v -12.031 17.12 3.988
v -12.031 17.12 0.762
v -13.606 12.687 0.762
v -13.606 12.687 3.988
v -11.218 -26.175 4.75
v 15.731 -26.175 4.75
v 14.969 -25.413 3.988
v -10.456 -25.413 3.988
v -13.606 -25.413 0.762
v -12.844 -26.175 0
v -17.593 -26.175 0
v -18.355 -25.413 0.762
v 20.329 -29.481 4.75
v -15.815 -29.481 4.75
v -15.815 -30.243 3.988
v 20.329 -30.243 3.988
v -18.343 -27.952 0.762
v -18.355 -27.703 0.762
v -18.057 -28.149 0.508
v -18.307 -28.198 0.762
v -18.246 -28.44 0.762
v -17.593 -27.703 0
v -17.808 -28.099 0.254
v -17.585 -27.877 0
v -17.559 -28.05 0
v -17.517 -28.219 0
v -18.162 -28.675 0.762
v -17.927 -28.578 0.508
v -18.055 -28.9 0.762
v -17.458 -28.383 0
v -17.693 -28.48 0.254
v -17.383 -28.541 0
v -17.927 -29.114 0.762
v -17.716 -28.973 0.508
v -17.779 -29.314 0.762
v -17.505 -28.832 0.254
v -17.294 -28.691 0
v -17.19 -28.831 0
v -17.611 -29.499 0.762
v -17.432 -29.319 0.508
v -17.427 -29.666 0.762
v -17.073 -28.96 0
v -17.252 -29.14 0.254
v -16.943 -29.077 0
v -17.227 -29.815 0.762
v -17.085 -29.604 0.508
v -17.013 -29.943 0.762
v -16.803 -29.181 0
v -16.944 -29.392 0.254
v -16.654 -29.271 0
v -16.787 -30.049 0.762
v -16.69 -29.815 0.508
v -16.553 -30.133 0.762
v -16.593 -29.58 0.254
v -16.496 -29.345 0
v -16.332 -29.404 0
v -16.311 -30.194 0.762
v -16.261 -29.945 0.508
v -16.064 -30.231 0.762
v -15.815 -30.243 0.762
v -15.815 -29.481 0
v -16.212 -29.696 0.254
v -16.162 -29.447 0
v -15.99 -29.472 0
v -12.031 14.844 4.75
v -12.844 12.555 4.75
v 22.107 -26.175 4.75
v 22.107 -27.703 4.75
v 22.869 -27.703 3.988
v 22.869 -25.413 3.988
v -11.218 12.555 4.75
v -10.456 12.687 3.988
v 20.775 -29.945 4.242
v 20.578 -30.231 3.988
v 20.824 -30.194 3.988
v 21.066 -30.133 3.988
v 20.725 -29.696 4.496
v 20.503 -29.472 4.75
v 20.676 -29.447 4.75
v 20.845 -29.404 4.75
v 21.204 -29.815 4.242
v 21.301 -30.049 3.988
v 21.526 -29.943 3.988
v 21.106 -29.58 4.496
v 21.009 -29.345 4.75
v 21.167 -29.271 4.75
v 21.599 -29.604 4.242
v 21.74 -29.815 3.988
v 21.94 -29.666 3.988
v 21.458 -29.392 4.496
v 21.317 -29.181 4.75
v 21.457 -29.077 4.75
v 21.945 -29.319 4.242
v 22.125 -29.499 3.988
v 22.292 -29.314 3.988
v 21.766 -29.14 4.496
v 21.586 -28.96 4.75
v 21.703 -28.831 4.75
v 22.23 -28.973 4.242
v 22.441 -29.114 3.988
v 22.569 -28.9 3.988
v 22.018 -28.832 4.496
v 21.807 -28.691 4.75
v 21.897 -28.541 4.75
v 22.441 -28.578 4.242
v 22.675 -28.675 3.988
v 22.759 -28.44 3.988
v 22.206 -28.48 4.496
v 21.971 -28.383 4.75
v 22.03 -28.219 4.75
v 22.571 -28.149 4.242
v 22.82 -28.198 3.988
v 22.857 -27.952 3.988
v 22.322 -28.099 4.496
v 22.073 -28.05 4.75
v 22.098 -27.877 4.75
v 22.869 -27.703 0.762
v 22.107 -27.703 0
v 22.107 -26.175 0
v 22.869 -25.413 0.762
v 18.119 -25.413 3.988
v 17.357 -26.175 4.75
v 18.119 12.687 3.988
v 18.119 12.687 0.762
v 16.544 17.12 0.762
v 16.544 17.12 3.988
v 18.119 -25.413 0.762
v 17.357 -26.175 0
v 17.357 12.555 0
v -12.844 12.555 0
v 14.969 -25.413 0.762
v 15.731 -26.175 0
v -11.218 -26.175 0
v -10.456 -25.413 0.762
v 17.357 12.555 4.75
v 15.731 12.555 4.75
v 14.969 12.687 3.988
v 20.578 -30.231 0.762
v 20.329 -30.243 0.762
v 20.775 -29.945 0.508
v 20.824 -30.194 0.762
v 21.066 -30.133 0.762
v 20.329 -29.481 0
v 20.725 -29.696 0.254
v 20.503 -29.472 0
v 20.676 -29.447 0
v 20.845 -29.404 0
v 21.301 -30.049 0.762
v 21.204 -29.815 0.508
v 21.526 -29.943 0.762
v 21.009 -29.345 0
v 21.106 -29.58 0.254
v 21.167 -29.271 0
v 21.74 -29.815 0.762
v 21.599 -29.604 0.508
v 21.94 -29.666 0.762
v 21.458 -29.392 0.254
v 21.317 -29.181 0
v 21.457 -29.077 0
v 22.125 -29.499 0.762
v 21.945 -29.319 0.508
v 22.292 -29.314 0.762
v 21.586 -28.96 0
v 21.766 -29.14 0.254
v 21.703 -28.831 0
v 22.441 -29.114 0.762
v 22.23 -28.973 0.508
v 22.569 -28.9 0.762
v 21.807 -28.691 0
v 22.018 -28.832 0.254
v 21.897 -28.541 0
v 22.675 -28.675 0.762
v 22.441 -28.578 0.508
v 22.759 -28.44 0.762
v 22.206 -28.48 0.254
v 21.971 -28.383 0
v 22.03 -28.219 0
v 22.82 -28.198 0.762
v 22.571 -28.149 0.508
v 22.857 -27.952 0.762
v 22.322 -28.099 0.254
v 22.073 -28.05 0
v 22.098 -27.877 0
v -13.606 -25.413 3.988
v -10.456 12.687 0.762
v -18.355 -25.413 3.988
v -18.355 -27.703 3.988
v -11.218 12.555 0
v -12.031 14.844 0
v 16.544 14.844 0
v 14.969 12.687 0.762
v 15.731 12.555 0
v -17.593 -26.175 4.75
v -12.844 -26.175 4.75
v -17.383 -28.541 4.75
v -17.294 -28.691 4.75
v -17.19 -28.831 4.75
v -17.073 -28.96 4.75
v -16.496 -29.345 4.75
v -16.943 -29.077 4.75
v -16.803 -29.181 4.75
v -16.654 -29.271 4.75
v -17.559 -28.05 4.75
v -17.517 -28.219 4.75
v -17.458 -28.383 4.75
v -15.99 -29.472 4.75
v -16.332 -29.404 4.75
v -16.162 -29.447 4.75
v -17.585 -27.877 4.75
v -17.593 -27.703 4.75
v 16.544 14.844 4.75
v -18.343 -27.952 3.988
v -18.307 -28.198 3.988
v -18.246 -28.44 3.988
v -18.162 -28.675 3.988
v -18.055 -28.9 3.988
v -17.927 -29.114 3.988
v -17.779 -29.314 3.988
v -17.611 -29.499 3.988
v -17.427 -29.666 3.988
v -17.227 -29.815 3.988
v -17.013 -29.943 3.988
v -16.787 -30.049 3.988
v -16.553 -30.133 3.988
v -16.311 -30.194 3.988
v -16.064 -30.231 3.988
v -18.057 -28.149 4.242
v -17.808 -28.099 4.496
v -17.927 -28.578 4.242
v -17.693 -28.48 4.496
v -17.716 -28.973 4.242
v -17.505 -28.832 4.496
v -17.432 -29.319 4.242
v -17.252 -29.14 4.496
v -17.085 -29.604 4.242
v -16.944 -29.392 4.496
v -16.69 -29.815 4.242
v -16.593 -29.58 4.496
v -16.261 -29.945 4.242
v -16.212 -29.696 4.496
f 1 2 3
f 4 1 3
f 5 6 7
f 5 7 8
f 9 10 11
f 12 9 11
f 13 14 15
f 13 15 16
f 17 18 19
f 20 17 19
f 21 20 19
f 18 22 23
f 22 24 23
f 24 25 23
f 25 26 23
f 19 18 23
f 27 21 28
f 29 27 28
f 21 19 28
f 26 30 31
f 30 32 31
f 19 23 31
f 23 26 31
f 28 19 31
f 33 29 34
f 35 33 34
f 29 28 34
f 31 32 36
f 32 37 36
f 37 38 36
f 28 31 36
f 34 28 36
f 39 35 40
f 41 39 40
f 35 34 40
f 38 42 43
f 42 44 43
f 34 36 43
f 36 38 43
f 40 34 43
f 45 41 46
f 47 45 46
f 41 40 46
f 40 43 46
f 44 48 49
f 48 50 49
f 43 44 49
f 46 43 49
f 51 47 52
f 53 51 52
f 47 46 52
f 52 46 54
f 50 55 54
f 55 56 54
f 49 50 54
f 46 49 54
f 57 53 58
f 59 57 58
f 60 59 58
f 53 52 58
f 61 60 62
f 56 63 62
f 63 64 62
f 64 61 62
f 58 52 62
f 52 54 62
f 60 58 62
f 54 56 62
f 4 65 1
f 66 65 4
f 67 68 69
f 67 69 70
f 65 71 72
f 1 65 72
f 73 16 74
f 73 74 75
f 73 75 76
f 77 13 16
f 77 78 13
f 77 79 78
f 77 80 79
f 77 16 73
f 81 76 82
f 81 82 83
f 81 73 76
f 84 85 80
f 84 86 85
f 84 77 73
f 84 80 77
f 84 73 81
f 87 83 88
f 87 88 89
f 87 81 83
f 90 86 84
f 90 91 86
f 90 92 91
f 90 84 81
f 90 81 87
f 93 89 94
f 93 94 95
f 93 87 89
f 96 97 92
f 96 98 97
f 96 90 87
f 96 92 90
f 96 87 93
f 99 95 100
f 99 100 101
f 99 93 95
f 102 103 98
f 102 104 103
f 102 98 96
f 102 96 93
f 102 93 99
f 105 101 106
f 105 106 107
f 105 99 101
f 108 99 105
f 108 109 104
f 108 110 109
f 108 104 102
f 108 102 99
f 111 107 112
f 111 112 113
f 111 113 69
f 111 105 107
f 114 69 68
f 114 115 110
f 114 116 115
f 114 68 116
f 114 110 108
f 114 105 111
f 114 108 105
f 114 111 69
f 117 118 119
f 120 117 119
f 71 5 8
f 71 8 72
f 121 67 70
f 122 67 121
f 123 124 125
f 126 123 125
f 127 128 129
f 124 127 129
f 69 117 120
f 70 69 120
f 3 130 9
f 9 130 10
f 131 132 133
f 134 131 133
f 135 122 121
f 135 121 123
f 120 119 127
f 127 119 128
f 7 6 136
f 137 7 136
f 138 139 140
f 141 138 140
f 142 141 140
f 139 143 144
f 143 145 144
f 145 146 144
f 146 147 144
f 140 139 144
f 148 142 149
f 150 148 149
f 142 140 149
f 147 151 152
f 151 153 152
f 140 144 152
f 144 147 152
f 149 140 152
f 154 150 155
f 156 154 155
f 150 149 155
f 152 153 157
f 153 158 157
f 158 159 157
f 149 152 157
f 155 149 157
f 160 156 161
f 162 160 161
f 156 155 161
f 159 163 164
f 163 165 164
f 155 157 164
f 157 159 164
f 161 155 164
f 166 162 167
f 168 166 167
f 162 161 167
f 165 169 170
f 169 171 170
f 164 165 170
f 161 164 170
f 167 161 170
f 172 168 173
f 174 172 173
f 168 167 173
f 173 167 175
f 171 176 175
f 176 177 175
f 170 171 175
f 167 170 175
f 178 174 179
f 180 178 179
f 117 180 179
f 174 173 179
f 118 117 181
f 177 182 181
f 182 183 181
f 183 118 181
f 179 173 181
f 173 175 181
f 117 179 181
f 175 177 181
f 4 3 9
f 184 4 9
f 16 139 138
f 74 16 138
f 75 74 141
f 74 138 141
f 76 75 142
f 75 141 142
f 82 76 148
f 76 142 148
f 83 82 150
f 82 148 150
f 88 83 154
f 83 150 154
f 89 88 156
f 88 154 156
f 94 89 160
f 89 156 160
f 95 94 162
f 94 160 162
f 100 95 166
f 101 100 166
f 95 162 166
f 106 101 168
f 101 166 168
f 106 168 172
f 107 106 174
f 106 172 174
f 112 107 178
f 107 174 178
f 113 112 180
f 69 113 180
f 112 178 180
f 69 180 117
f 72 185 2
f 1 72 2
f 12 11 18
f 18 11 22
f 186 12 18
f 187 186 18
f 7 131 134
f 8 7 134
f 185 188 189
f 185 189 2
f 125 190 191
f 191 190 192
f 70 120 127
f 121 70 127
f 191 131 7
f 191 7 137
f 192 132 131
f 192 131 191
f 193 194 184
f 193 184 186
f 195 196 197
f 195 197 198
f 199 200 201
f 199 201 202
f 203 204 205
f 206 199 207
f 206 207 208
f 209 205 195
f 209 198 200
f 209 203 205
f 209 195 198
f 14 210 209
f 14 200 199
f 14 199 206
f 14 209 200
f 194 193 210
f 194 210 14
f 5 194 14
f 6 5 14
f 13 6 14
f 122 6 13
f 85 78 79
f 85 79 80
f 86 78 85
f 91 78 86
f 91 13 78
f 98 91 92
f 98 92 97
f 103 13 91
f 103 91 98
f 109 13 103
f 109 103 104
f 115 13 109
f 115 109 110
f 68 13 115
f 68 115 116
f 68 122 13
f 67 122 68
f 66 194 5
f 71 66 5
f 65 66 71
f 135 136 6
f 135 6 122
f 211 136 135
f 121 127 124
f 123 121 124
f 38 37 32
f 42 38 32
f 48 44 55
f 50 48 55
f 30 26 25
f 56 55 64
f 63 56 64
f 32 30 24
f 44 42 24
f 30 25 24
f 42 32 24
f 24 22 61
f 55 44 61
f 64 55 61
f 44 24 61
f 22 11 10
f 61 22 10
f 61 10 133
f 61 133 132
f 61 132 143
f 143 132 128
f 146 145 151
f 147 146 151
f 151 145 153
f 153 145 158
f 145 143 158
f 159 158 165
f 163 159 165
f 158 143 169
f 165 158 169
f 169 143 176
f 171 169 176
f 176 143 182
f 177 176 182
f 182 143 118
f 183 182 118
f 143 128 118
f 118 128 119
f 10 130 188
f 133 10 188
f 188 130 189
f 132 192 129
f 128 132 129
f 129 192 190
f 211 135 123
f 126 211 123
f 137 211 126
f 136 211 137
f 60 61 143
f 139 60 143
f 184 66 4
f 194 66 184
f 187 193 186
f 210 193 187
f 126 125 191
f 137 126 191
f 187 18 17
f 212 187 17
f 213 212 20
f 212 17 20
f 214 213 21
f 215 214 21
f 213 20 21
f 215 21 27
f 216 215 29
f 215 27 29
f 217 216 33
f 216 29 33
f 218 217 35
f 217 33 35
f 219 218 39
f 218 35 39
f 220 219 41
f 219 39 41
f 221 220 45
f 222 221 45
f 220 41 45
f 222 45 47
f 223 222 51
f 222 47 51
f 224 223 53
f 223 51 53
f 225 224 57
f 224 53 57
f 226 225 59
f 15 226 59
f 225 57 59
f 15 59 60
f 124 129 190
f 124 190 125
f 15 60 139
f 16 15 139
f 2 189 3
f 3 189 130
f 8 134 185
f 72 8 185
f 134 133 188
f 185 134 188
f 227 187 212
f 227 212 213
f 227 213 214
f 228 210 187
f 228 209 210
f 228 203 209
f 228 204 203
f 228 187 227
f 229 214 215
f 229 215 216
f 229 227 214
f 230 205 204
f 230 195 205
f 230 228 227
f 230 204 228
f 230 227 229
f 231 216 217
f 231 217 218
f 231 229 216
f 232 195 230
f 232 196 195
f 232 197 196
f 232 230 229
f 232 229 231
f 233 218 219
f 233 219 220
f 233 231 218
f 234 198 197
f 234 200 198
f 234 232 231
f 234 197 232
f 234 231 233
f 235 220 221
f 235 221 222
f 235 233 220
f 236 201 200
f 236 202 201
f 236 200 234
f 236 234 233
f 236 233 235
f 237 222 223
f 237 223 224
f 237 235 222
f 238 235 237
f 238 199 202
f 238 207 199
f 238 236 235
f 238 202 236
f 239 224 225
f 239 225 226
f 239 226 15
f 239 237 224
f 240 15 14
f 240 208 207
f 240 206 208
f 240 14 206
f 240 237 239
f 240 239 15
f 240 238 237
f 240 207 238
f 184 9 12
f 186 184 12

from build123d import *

# Parameters (mm, degrees)
F0_W     = 1.5748
F0_H     = 38.1
F1_DEPTH = 4.7498
F2_SIZE  = 0.762


# Not quite as in the source:
# - a feature names something its author has since deleted; it is built from what else it names


with BuildPart() as f1:
    # F0 (on Top) → F1 (new body)
    with BuildSketch(Plane.XY):
        with Locations((-11.2433909576, -6.3634803519)):
            Rectangle(F0_W, F0_H)
        with BuildLine():
            Line((-10.4559909576, -25.4134803519), (-12.0307909576, -25.4134803519))
            Line((-12.0307909576, -25.4134803519), (-12.0307909576, 12.6865196481))
            Line((-12.0307909576, 12.6865196481), (-12.0307909576, 17.1203389764))
            Line((-12.0307909576, 17.1203389764), (-13.6055909576, 12.6865196481))
            Line((-13.6055909576, 12.6865196481), (-13.6055909576, -25.4134803519))
            Line((-13.6055909576, -25.4134803519), (-18.3553909576, -25.4134803519))
            Line((-18.3553909576, -25.4134803519), (-18.3553909576, -27.7027830635))
            ThreePointArc((-18.3553909576, -27.7027830635), (-17.6114421818, -29.4988342878), (-15.8153909576, -30.2427830635))
            Line((-15.8153909576, -30.2427830635), (20.3288090424, -30.2427830635))
            ThreePointArc((20.3288090424, -30.2427830635), (22.1248602666, -29.4988342878), (22.8688090424, -27.7027830635))
            Line((22.8688090424, -27.7027830635), (22.8688090424, -25.4134803519))
            Line((22.8688090424, -25.4134803519), (18.1190090424, -25.4134803519))
            Line((18.1190090424, -25.4134803519), (18.1190090424, 12.6865196481))
            Line((18.1190090424, 12.6865196481), (16.5442090424, 17.1203389764))
            Line((16.5442090424, 17.1203389764), (16.5442090424, 12.6865196481))
            Line((16.5442090424, 12.6865196481), (16.5442090424, -25.4134803519))
            Line((16.5442090424, -25.4134803519), (14.9694090424, -25.4134803519))
            Line((14.9694090424, -25.4134803519), (-10.4559909576, -25.4134803519))
        make_face()
        with Locations((15.7568090424, -6.3634803519)):
            Rectangle(F0_W, F0_H)
        Polygon((-12.0307909576, 17.1203389764), (-12.0307909576, 12.6865196481), (-10.4559909576, 12.6865196481), align=None)
        Polygon((16.5442090424, 17.1203389764), (14.9694090424, 12.6865196481), (16.5442090424, 12.6865196481), align=None)
    extrude(amount=F1_DEPTH)

    # F2
    f2_edges = [f1.edges().sort_by_distance(p)[0] for p in [
        (-13.605591, -6.36348, 4.7498),
        (-10.455991, -6.36348, 4.7498),
        (-11.243391, 14.903429, 4.7498),
        (-12.818191, 14.903429, 4.7498),
        (-15.980491, -25.41348, 4.7498),
        (-18.355391, -26.558132, 4.7498),
        (-17.611442, -29.498834, 4.7498),
        (2.256709, -30.242783, 4.7498),
        (22.12486, -29.498834, 4.7498),
        (22.868809, -26.558132, 4.7498),
        (20.493909, -25.41348, 4.7498),
        (18.119009, -6.36348, 4.7498),
        (17.331609, 14.903429, 4.7498),
        (15.756809, 14.903429, 4.7498),
        (14.969409, -6.36348, 4.7498),
        (2.256709, -25.41348, 4.7498),
        (-10.455991, -6.36348, 0),
        (-11.243391, 14.903429, 0),
        (-12.818191, 14.903429, 0),
        (-13.605591, -6.36348, 0),
        (-15.980491, -25.41348, 0),
        (-18.355391, -26.558132, 0),
        (-17.611442, -29.498834, 0),
        (2.256709, -30.242783, 0),
        (22.12486, -29.498834, 0),
        (22.868809, -26.558132, 0),
        (20.493909, -25.41348, 0),
        (18.119009, -6.36348, 0),
        (17.331609, 14.903429, 0),
        (15.756809, 14.903429, 0),
        (14.969409, -6.36348, 0),
        (2.256709, -25.41348, 0),
    ]]
    chamfer(f2_edges, length=F2_SIZE)


solid = f1.part
